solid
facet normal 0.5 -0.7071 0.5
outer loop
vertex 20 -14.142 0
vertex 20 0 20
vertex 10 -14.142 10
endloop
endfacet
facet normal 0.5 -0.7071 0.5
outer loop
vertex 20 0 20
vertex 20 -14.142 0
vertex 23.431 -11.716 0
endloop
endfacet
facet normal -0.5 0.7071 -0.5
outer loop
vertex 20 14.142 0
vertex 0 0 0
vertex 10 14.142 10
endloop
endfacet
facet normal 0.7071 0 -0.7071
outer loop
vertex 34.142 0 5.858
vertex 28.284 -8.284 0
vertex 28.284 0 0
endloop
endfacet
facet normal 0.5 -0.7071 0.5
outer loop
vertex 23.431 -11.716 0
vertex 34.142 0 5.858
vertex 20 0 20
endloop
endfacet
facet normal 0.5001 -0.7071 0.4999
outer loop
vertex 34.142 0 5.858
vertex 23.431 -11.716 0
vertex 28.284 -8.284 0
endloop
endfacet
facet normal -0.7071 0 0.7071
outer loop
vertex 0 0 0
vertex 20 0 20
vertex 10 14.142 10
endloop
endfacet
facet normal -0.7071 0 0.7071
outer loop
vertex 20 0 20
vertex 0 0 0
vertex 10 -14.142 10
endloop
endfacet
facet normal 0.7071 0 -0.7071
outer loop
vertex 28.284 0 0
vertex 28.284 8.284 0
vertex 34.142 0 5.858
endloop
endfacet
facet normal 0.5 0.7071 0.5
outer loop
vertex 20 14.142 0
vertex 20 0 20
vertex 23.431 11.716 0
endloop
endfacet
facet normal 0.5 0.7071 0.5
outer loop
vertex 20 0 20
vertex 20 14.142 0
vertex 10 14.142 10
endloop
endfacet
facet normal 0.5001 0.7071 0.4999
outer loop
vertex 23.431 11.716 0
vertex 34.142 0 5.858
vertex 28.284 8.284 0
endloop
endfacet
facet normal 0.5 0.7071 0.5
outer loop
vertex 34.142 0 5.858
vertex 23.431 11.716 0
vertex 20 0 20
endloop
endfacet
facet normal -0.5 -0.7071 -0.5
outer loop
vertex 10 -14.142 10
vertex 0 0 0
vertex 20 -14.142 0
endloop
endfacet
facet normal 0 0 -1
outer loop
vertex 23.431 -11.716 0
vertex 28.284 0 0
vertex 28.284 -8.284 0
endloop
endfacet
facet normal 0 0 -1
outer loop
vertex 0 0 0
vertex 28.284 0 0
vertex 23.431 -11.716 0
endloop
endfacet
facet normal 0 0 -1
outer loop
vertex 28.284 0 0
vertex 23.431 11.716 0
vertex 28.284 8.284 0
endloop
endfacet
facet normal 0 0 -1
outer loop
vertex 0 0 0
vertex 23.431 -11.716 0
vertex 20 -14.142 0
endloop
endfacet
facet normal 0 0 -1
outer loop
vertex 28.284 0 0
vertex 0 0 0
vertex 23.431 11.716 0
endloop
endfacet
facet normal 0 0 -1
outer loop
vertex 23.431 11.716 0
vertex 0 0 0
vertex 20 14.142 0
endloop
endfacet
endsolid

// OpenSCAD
a = 20; // Alu cross section
b = 1.2; // Alu thickness
c = 40; // length of plug
d = 0.1; // Clearance tolerance

difference() {
    rotate([45,45,0]) cube([a, a, a], center=false);
    translate([0,0,-4*a]) cube([a*8, a*8, a*8], center=true);
}
